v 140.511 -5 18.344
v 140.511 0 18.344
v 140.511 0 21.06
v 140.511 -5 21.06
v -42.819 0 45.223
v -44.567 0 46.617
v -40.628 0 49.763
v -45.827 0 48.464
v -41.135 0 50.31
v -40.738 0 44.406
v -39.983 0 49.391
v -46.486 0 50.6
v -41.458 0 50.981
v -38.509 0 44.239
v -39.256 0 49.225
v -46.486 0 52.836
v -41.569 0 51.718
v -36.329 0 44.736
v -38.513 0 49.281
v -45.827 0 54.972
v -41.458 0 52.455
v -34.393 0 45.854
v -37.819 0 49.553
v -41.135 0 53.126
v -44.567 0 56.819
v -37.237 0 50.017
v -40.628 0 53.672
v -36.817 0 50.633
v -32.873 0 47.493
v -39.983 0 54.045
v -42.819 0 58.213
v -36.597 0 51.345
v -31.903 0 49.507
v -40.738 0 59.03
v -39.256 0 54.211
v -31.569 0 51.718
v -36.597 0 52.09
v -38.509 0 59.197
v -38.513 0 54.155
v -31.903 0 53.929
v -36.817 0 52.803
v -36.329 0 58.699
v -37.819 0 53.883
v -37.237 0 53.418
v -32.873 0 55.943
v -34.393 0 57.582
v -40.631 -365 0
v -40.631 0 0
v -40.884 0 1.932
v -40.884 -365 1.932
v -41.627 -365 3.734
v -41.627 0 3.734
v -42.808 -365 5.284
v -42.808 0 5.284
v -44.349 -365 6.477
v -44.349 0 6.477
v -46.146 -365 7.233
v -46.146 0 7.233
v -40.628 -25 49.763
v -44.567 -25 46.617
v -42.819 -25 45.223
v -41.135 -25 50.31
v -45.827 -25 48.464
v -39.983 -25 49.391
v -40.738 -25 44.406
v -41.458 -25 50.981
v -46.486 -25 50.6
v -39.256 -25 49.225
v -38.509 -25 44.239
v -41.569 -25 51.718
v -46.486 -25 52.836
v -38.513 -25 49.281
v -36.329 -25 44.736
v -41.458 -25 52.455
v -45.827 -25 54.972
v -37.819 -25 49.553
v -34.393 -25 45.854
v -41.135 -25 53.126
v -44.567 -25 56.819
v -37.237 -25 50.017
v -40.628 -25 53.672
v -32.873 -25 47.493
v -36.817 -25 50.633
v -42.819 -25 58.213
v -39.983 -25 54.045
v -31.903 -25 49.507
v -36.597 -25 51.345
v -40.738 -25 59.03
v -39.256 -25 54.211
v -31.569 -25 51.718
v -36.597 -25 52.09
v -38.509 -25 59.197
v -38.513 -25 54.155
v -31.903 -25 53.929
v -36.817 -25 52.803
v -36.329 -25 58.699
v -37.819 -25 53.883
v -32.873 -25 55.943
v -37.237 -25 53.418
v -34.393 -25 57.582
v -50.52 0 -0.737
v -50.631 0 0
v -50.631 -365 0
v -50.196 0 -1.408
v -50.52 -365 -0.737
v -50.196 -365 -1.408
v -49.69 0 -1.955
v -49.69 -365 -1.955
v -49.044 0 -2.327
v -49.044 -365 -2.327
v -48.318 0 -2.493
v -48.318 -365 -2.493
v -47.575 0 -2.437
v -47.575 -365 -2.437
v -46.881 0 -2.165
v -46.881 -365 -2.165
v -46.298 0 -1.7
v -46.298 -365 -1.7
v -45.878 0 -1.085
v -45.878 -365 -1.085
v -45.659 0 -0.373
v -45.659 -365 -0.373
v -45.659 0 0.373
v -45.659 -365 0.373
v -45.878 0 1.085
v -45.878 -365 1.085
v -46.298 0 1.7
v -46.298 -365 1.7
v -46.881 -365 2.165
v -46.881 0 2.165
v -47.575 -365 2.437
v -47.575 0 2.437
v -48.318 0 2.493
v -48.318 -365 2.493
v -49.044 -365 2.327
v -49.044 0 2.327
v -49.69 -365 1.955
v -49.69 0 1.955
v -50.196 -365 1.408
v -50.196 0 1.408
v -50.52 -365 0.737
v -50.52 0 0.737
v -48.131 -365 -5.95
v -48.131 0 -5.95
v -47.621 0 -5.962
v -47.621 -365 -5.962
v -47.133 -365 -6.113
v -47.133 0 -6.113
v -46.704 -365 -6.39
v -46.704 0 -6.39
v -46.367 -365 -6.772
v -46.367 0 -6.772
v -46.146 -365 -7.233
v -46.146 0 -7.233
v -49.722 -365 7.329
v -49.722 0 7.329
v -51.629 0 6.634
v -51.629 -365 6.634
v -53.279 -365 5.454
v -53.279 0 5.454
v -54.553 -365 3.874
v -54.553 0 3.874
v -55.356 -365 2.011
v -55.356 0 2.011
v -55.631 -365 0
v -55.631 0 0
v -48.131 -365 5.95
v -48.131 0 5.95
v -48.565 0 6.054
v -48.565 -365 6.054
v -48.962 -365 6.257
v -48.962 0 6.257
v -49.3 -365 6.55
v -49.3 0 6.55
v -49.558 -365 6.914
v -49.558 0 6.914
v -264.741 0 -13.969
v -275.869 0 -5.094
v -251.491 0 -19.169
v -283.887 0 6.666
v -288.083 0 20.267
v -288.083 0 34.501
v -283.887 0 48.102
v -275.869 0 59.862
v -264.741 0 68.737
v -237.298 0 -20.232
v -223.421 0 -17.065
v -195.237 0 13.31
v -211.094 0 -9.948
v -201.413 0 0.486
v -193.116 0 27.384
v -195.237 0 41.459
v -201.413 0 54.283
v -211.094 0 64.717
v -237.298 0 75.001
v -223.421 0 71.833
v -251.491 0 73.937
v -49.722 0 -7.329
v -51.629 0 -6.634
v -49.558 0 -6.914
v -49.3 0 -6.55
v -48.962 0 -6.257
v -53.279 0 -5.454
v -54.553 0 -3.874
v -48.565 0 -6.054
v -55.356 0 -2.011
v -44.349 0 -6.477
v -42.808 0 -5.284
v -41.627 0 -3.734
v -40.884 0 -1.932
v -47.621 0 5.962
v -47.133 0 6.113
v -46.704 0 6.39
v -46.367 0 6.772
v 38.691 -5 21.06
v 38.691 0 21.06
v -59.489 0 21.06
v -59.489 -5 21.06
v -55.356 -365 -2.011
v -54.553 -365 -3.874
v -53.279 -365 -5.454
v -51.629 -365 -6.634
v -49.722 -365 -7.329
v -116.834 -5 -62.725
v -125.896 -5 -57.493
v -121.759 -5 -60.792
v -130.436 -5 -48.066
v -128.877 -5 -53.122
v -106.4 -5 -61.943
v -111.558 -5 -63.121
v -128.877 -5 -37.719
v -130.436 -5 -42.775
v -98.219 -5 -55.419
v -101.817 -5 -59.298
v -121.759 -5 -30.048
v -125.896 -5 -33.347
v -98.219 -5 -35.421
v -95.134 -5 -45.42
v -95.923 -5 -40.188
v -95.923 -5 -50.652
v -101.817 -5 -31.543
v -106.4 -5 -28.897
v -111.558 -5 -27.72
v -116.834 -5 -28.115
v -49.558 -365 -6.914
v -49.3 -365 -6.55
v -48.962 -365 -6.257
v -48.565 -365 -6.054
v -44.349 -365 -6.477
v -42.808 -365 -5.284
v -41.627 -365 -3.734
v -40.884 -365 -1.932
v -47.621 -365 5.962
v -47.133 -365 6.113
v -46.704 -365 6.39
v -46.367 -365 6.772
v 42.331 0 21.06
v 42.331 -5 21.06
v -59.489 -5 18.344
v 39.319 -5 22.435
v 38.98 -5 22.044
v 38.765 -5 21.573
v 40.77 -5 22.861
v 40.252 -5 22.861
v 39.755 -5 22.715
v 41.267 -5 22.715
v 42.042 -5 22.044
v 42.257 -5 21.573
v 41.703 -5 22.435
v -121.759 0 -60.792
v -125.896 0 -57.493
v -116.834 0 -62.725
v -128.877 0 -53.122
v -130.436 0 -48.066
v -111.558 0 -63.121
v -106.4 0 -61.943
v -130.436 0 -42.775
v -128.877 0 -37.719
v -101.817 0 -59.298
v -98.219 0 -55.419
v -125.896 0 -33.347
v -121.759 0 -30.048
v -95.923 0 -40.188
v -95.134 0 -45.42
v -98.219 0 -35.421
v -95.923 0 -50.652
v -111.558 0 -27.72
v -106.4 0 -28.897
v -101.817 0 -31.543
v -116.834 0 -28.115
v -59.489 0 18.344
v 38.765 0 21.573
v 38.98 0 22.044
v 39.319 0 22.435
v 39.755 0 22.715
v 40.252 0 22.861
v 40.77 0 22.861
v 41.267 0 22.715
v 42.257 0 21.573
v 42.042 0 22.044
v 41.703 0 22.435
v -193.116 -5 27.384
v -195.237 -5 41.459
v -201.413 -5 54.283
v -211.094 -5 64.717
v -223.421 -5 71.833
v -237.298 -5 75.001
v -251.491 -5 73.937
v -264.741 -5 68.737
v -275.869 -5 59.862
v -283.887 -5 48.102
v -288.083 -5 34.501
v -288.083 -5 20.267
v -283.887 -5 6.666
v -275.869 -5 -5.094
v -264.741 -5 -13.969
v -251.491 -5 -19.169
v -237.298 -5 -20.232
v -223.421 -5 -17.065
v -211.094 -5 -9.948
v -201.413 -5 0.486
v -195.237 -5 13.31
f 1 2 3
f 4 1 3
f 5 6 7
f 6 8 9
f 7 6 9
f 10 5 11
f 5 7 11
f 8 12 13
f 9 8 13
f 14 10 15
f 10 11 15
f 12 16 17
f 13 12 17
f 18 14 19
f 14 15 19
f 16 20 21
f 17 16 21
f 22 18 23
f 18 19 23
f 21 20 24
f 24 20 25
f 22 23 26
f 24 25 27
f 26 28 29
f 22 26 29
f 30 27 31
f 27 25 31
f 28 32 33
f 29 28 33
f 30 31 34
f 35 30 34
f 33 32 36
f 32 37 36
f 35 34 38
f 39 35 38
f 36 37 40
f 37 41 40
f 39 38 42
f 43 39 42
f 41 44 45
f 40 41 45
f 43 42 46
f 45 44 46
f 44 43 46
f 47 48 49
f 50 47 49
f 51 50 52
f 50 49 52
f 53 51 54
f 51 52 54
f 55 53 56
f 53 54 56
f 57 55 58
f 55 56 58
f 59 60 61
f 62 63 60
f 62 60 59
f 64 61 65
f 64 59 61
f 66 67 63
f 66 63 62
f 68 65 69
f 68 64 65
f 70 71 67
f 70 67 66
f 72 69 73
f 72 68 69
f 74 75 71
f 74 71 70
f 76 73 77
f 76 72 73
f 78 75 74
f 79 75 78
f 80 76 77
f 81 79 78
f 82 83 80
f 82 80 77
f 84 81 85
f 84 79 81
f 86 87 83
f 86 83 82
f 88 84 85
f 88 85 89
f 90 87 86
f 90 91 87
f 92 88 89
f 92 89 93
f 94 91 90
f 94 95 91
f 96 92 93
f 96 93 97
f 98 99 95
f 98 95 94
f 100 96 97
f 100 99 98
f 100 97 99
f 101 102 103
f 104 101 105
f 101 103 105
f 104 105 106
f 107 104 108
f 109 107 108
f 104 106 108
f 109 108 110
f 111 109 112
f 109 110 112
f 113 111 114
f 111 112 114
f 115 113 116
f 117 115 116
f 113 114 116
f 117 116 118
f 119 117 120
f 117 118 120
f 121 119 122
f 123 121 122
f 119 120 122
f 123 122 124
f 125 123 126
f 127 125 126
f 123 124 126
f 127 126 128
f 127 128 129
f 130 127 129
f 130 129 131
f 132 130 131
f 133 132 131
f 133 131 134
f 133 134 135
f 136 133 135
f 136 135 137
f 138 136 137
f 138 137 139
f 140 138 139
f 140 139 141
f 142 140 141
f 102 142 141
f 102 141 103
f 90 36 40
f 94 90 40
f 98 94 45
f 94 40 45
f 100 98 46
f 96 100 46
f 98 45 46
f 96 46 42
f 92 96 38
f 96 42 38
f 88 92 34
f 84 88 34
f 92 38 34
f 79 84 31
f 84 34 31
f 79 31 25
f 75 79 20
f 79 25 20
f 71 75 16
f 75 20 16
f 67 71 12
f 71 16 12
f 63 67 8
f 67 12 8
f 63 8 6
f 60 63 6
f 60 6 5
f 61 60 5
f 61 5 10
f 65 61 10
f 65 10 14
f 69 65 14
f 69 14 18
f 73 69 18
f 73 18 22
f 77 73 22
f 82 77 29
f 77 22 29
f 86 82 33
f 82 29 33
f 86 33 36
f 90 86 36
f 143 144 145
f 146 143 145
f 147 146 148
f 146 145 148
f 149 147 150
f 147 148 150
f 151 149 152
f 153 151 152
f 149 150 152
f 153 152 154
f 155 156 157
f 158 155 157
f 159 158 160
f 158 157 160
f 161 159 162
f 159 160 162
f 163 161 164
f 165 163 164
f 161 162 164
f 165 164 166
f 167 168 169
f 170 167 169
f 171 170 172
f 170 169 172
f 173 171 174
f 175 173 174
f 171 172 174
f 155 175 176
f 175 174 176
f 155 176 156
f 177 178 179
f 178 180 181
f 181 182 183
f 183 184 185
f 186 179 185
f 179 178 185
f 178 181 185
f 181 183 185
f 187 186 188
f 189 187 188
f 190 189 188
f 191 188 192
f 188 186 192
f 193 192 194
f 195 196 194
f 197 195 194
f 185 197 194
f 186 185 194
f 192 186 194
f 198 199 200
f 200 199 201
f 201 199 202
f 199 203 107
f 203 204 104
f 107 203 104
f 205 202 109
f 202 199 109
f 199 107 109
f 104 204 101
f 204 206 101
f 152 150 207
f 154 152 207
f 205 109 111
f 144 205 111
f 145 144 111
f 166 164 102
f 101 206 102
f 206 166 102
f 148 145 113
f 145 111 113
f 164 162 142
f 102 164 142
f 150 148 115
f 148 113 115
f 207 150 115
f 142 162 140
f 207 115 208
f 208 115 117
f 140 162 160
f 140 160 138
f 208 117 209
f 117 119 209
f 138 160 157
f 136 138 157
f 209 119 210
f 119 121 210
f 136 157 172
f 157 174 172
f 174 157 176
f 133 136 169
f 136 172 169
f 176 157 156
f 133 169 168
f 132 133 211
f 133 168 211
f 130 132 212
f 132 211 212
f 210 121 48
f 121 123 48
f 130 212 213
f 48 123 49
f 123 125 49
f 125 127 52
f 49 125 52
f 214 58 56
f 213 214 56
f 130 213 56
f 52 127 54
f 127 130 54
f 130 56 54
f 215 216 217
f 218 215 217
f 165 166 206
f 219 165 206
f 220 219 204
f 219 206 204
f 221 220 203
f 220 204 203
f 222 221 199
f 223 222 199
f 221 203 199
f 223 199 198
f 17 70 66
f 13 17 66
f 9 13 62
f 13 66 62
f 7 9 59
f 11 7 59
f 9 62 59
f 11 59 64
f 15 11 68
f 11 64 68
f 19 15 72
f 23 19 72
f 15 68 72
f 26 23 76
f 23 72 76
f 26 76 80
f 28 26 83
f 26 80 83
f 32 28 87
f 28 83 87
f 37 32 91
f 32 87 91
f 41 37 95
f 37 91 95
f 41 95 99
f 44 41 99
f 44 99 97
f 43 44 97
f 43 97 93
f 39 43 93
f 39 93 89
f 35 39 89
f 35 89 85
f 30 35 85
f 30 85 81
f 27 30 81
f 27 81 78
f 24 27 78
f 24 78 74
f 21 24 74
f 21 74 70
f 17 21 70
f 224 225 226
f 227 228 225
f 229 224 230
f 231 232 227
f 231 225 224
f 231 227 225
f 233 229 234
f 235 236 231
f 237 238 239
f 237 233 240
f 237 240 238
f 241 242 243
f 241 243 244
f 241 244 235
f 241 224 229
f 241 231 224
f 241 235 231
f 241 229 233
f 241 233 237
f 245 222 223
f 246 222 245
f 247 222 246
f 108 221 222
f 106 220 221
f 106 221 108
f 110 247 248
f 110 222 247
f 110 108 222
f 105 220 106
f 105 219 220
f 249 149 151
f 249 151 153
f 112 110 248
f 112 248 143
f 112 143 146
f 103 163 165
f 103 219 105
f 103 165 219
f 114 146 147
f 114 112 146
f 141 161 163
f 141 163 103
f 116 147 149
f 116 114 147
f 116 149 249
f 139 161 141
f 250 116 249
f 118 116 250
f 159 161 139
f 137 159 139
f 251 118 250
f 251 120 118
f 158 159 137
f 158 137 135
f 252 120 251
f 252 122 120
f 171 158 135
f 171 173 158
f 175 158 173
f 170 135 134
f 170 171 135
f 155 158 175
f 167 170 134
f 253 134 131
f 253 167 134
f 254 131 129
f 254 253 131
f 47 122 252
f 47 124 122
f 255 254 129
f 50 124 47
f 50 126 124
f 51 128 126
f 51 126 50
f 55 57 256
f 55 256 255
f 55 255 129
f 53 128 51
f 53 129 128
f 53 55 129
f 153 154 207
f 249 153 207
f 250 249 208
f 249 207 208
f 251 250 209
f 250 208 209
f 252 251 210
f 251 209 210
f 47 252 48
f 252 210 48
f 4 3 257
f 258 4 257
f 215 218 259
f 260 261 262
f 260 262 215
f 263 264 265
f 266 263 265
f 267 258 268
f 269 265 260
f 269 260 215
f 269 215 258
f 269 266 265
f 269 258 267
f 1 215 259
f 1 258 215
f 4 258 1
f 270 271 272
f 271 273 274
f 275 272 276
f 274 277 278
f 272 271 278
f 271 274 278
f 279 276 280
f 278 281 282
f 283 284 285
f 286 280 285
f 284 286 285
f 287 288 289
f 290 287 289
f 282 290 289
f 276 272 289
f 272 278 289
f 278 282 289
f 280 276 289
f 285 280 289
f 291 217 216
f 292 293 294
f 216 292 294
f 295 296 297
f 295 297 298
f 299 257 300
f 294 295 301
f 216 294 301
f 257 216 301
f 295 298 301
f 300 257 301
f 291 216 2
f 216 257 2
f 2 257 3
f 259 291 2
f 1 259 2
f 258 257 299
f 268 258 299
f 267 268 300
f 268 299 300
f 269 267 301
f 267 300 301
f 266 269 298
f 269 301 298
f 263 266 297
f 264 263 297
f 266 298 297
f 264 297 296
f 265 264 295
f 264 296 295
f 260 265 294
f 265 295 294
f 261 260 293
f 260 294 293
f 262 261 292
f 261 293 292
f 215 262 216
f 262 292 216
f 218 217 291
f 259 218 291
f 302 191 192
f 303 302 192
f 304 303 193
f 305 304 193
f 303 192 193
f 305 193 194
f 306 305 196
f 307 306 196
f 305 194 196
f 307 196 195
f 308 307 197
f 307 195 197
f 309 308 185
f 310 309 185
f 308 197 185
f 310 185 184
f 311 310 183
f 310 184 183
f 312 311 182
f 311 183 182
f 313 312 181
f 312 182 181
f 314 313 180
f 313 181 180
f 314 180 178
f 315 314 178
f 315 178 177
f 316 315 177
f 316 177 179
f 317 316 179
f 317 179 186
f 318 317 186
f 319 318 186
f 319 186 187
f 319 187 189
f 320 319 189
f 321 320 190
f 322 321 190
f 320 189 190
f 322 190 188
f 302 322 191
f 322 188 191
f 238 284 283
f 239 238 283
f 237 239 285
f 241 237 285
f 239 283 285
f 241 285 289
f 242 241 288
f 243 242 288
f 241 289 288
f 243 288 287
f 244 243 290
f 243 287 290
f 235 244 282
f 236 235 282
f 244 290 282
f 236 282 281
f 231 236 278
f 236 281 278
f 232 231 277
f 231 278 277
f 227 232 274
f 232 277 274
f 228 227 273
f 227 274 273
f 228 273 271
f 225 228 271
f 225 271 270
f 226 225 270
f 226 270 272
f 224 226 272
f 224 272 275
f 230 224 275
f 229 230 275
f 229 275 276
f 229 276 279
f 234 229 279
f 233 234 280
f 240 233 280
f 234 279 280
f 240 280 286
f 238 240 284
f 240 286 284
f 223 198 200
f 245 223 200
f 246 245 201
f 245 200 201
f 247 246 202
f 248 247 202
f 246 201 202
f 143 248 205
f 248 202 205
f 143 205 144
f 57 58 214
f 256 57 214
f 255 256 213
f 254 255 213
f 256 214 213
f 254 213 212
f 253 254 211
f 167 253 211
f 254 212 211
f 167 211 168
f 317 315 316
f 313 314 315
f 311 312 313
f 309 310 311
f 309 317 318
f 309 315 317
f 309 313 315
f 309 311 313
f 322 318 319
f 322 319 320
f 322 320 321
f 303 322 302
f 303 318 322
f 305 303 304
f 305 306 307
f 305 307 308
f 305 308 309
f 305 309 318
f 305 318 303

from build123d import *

# Parameters (mm, degrees)
F1_DEPTH = 365
F2_D     = 5
F0_R     = 7.5
F3_DEPTH = 25
F4_D     = 5
F5_DEPTH = 5
F0_R_2   = 17.75
F6_DEPTH = 5
F0_R_3   = 47.75


with BuildPart() as f1:
    # F0 (on Front) → F1 (new body)
    with BuildSketch(Plane.XZ):
        with BuildLine():
            ThreePointArc((-49.7219281873, 7.329294514), (-53.9696651294, 4.7072880038), (-55.630877614, 0))
            Line((-55.630877614, 0), (-48.130877614, 0))
            Line((-48.130877614, 0), (-48.130877614, 5.9503076512))
            ThreePointArc((-48.130877614, 5.9503076512), (-49.1398926819, 6.3934803612), (-49.7219281873, 7.329294514))
        make_face()
        with BuildLine():
            Line((-48.130877614, 5.9503076512), (-48.130877614, 0))
            Line((-48.130877614, 0), (-40.630877614, 0))
            ThreePointArc((-40.630877614, 0), (-42.1668750711, 4.5476008694), (-46.1457239254, 7.2325075066))
            ThreePointArc((-46.1457239254, 7.2325075066), (-46.9089704315, 6.2363490715), (-48.130877614, 5.9503076512))
        make_face()
        with BuildLine():
            Line((-40.630877614, 0), (-48.130877614, 0))
            Line((-48.130877614, 0), (-48.130877614, -5.9503076512))
            ThreePointArc((-48.130877614, -5.9503076512), (-46.9089704315, -6.2363490715), (-46.1457239254, -7.2325075066))
            ThreePointArc((-46.1457239254, -7.2325075066), (-42.1668750711, -4.5476008694), (-40.630877614, 0))
        make_face()
        with BuildLine():
            Line((-48.130877614, 0), (-55.630877614, 0))
            ThreePointArc((-55.630877614, 0), (-53.9696651294, -4.7072880038), (-49.7219281873, -7.329294514))
            ThreePointArc((-49.7219281873, -7.329294514), (-49.1398926819, -6.3934803612), (-48.130877614, -5.9503076512))
            Line((-48.130877614, -5.9503076512), (-48.130877614, 0))
        make_face()
    extrude(amount=F1_DEPTH)

    # F2 (through all)
    with Locations(Plane(origin=(0, 0, 0), x_dir=(1, 0, 0), z_dir=(0, 1, 0))):
        with Locations((-48.130877614, 0)):
            Hole(F2_D / 2)


with BuildPart() as f3:
    # F0 (on Front) → F3 (new body)
    with BuildSketch(Plane.XZ):
        with Locations((-39.0694960952, 51.7178885639)):
            Circle(F0_R)
    extrude(amount=F3_DEPTH)

    # F4 (through all)
    with Locations(Plane(origin=(0, 0, 0), x_dir=(1, 0, 0), z_dir=(0, 1, 0))):
        with Locations((-39.0694960952, -51.7178885639)):
            Hole(F4_D / 2)


with BuildPart() as f5:
    # F0 (on Front) → F5 (new body)
    with BuildSketch(Plane.XZ):
        with BuildLine():
            Line((140.511085093, 21.0598856211), (42.331085093, 21.0598856211))
            ThreePointArc((42.331085093, 21.0598856211), (40.511085093, 19.2398856211), (38.691085093, 21.0598856211))
            Line((38.691085093, 21.0598856211), (-59.488914907, 21.0598856211))
            Line((-59.488914907, 21.0598856211), (-59.488914907, 18.3438919485))
            Line((-59.488914907, 18.3438919485), (140.511085093, 18.3438919485))
            Line((140.511085093, 18.3438919485), (140.511085093, 21.0598856211))
        make_face()
        with BuildLine():
            Line((40.511085093, 21.0598856211), (42.331085093, 21.0598856211))
            ThreePointArc((42.331085093, 21.0598856211), (40.511085093, 22.8798856211), (38.691085093, 21.0598856211))
            Line((38.691085093, 21.0598856211), (40.511085093, 21.0598856211))
        make_face()
        with BuildLine():
            ThreePointArc((38.691085093, 21.0598856211), (40.511085093, 19.2398856211), (42.331085093, 21.0598856211))
            Line((42.331085093, 21.0598856211), (40.511085093, 21.0598856211))
            Line((40.511085093, 21.0598856211), (38.691085093, 21.0598856211))
        make_face()
    extrude(amount=F5_DEPTH)


with BuildPart() as f6:
    # F0 (on Front) → F6 (new body)
    with BuildSketch(Plane.XZ):
        with Locations((-112.8843203187, -45.4202629626)):
            Circle(F0_R_2)
    extrude(amount=F6_DEPTH)


with BuildPart() as f6b:
    # F0 (on Front) → F6, piece 2 (new body)
    with BuildSketch(Plane.XZ):
        with Locations((-240.8659905195, 27.3840799928)):
            Circle(F0_R_3)
    extrude(amount=F6_DEPTH)


solid = Compound([f1.part, f3.part, f5.part, f6.part, f6b.part])
